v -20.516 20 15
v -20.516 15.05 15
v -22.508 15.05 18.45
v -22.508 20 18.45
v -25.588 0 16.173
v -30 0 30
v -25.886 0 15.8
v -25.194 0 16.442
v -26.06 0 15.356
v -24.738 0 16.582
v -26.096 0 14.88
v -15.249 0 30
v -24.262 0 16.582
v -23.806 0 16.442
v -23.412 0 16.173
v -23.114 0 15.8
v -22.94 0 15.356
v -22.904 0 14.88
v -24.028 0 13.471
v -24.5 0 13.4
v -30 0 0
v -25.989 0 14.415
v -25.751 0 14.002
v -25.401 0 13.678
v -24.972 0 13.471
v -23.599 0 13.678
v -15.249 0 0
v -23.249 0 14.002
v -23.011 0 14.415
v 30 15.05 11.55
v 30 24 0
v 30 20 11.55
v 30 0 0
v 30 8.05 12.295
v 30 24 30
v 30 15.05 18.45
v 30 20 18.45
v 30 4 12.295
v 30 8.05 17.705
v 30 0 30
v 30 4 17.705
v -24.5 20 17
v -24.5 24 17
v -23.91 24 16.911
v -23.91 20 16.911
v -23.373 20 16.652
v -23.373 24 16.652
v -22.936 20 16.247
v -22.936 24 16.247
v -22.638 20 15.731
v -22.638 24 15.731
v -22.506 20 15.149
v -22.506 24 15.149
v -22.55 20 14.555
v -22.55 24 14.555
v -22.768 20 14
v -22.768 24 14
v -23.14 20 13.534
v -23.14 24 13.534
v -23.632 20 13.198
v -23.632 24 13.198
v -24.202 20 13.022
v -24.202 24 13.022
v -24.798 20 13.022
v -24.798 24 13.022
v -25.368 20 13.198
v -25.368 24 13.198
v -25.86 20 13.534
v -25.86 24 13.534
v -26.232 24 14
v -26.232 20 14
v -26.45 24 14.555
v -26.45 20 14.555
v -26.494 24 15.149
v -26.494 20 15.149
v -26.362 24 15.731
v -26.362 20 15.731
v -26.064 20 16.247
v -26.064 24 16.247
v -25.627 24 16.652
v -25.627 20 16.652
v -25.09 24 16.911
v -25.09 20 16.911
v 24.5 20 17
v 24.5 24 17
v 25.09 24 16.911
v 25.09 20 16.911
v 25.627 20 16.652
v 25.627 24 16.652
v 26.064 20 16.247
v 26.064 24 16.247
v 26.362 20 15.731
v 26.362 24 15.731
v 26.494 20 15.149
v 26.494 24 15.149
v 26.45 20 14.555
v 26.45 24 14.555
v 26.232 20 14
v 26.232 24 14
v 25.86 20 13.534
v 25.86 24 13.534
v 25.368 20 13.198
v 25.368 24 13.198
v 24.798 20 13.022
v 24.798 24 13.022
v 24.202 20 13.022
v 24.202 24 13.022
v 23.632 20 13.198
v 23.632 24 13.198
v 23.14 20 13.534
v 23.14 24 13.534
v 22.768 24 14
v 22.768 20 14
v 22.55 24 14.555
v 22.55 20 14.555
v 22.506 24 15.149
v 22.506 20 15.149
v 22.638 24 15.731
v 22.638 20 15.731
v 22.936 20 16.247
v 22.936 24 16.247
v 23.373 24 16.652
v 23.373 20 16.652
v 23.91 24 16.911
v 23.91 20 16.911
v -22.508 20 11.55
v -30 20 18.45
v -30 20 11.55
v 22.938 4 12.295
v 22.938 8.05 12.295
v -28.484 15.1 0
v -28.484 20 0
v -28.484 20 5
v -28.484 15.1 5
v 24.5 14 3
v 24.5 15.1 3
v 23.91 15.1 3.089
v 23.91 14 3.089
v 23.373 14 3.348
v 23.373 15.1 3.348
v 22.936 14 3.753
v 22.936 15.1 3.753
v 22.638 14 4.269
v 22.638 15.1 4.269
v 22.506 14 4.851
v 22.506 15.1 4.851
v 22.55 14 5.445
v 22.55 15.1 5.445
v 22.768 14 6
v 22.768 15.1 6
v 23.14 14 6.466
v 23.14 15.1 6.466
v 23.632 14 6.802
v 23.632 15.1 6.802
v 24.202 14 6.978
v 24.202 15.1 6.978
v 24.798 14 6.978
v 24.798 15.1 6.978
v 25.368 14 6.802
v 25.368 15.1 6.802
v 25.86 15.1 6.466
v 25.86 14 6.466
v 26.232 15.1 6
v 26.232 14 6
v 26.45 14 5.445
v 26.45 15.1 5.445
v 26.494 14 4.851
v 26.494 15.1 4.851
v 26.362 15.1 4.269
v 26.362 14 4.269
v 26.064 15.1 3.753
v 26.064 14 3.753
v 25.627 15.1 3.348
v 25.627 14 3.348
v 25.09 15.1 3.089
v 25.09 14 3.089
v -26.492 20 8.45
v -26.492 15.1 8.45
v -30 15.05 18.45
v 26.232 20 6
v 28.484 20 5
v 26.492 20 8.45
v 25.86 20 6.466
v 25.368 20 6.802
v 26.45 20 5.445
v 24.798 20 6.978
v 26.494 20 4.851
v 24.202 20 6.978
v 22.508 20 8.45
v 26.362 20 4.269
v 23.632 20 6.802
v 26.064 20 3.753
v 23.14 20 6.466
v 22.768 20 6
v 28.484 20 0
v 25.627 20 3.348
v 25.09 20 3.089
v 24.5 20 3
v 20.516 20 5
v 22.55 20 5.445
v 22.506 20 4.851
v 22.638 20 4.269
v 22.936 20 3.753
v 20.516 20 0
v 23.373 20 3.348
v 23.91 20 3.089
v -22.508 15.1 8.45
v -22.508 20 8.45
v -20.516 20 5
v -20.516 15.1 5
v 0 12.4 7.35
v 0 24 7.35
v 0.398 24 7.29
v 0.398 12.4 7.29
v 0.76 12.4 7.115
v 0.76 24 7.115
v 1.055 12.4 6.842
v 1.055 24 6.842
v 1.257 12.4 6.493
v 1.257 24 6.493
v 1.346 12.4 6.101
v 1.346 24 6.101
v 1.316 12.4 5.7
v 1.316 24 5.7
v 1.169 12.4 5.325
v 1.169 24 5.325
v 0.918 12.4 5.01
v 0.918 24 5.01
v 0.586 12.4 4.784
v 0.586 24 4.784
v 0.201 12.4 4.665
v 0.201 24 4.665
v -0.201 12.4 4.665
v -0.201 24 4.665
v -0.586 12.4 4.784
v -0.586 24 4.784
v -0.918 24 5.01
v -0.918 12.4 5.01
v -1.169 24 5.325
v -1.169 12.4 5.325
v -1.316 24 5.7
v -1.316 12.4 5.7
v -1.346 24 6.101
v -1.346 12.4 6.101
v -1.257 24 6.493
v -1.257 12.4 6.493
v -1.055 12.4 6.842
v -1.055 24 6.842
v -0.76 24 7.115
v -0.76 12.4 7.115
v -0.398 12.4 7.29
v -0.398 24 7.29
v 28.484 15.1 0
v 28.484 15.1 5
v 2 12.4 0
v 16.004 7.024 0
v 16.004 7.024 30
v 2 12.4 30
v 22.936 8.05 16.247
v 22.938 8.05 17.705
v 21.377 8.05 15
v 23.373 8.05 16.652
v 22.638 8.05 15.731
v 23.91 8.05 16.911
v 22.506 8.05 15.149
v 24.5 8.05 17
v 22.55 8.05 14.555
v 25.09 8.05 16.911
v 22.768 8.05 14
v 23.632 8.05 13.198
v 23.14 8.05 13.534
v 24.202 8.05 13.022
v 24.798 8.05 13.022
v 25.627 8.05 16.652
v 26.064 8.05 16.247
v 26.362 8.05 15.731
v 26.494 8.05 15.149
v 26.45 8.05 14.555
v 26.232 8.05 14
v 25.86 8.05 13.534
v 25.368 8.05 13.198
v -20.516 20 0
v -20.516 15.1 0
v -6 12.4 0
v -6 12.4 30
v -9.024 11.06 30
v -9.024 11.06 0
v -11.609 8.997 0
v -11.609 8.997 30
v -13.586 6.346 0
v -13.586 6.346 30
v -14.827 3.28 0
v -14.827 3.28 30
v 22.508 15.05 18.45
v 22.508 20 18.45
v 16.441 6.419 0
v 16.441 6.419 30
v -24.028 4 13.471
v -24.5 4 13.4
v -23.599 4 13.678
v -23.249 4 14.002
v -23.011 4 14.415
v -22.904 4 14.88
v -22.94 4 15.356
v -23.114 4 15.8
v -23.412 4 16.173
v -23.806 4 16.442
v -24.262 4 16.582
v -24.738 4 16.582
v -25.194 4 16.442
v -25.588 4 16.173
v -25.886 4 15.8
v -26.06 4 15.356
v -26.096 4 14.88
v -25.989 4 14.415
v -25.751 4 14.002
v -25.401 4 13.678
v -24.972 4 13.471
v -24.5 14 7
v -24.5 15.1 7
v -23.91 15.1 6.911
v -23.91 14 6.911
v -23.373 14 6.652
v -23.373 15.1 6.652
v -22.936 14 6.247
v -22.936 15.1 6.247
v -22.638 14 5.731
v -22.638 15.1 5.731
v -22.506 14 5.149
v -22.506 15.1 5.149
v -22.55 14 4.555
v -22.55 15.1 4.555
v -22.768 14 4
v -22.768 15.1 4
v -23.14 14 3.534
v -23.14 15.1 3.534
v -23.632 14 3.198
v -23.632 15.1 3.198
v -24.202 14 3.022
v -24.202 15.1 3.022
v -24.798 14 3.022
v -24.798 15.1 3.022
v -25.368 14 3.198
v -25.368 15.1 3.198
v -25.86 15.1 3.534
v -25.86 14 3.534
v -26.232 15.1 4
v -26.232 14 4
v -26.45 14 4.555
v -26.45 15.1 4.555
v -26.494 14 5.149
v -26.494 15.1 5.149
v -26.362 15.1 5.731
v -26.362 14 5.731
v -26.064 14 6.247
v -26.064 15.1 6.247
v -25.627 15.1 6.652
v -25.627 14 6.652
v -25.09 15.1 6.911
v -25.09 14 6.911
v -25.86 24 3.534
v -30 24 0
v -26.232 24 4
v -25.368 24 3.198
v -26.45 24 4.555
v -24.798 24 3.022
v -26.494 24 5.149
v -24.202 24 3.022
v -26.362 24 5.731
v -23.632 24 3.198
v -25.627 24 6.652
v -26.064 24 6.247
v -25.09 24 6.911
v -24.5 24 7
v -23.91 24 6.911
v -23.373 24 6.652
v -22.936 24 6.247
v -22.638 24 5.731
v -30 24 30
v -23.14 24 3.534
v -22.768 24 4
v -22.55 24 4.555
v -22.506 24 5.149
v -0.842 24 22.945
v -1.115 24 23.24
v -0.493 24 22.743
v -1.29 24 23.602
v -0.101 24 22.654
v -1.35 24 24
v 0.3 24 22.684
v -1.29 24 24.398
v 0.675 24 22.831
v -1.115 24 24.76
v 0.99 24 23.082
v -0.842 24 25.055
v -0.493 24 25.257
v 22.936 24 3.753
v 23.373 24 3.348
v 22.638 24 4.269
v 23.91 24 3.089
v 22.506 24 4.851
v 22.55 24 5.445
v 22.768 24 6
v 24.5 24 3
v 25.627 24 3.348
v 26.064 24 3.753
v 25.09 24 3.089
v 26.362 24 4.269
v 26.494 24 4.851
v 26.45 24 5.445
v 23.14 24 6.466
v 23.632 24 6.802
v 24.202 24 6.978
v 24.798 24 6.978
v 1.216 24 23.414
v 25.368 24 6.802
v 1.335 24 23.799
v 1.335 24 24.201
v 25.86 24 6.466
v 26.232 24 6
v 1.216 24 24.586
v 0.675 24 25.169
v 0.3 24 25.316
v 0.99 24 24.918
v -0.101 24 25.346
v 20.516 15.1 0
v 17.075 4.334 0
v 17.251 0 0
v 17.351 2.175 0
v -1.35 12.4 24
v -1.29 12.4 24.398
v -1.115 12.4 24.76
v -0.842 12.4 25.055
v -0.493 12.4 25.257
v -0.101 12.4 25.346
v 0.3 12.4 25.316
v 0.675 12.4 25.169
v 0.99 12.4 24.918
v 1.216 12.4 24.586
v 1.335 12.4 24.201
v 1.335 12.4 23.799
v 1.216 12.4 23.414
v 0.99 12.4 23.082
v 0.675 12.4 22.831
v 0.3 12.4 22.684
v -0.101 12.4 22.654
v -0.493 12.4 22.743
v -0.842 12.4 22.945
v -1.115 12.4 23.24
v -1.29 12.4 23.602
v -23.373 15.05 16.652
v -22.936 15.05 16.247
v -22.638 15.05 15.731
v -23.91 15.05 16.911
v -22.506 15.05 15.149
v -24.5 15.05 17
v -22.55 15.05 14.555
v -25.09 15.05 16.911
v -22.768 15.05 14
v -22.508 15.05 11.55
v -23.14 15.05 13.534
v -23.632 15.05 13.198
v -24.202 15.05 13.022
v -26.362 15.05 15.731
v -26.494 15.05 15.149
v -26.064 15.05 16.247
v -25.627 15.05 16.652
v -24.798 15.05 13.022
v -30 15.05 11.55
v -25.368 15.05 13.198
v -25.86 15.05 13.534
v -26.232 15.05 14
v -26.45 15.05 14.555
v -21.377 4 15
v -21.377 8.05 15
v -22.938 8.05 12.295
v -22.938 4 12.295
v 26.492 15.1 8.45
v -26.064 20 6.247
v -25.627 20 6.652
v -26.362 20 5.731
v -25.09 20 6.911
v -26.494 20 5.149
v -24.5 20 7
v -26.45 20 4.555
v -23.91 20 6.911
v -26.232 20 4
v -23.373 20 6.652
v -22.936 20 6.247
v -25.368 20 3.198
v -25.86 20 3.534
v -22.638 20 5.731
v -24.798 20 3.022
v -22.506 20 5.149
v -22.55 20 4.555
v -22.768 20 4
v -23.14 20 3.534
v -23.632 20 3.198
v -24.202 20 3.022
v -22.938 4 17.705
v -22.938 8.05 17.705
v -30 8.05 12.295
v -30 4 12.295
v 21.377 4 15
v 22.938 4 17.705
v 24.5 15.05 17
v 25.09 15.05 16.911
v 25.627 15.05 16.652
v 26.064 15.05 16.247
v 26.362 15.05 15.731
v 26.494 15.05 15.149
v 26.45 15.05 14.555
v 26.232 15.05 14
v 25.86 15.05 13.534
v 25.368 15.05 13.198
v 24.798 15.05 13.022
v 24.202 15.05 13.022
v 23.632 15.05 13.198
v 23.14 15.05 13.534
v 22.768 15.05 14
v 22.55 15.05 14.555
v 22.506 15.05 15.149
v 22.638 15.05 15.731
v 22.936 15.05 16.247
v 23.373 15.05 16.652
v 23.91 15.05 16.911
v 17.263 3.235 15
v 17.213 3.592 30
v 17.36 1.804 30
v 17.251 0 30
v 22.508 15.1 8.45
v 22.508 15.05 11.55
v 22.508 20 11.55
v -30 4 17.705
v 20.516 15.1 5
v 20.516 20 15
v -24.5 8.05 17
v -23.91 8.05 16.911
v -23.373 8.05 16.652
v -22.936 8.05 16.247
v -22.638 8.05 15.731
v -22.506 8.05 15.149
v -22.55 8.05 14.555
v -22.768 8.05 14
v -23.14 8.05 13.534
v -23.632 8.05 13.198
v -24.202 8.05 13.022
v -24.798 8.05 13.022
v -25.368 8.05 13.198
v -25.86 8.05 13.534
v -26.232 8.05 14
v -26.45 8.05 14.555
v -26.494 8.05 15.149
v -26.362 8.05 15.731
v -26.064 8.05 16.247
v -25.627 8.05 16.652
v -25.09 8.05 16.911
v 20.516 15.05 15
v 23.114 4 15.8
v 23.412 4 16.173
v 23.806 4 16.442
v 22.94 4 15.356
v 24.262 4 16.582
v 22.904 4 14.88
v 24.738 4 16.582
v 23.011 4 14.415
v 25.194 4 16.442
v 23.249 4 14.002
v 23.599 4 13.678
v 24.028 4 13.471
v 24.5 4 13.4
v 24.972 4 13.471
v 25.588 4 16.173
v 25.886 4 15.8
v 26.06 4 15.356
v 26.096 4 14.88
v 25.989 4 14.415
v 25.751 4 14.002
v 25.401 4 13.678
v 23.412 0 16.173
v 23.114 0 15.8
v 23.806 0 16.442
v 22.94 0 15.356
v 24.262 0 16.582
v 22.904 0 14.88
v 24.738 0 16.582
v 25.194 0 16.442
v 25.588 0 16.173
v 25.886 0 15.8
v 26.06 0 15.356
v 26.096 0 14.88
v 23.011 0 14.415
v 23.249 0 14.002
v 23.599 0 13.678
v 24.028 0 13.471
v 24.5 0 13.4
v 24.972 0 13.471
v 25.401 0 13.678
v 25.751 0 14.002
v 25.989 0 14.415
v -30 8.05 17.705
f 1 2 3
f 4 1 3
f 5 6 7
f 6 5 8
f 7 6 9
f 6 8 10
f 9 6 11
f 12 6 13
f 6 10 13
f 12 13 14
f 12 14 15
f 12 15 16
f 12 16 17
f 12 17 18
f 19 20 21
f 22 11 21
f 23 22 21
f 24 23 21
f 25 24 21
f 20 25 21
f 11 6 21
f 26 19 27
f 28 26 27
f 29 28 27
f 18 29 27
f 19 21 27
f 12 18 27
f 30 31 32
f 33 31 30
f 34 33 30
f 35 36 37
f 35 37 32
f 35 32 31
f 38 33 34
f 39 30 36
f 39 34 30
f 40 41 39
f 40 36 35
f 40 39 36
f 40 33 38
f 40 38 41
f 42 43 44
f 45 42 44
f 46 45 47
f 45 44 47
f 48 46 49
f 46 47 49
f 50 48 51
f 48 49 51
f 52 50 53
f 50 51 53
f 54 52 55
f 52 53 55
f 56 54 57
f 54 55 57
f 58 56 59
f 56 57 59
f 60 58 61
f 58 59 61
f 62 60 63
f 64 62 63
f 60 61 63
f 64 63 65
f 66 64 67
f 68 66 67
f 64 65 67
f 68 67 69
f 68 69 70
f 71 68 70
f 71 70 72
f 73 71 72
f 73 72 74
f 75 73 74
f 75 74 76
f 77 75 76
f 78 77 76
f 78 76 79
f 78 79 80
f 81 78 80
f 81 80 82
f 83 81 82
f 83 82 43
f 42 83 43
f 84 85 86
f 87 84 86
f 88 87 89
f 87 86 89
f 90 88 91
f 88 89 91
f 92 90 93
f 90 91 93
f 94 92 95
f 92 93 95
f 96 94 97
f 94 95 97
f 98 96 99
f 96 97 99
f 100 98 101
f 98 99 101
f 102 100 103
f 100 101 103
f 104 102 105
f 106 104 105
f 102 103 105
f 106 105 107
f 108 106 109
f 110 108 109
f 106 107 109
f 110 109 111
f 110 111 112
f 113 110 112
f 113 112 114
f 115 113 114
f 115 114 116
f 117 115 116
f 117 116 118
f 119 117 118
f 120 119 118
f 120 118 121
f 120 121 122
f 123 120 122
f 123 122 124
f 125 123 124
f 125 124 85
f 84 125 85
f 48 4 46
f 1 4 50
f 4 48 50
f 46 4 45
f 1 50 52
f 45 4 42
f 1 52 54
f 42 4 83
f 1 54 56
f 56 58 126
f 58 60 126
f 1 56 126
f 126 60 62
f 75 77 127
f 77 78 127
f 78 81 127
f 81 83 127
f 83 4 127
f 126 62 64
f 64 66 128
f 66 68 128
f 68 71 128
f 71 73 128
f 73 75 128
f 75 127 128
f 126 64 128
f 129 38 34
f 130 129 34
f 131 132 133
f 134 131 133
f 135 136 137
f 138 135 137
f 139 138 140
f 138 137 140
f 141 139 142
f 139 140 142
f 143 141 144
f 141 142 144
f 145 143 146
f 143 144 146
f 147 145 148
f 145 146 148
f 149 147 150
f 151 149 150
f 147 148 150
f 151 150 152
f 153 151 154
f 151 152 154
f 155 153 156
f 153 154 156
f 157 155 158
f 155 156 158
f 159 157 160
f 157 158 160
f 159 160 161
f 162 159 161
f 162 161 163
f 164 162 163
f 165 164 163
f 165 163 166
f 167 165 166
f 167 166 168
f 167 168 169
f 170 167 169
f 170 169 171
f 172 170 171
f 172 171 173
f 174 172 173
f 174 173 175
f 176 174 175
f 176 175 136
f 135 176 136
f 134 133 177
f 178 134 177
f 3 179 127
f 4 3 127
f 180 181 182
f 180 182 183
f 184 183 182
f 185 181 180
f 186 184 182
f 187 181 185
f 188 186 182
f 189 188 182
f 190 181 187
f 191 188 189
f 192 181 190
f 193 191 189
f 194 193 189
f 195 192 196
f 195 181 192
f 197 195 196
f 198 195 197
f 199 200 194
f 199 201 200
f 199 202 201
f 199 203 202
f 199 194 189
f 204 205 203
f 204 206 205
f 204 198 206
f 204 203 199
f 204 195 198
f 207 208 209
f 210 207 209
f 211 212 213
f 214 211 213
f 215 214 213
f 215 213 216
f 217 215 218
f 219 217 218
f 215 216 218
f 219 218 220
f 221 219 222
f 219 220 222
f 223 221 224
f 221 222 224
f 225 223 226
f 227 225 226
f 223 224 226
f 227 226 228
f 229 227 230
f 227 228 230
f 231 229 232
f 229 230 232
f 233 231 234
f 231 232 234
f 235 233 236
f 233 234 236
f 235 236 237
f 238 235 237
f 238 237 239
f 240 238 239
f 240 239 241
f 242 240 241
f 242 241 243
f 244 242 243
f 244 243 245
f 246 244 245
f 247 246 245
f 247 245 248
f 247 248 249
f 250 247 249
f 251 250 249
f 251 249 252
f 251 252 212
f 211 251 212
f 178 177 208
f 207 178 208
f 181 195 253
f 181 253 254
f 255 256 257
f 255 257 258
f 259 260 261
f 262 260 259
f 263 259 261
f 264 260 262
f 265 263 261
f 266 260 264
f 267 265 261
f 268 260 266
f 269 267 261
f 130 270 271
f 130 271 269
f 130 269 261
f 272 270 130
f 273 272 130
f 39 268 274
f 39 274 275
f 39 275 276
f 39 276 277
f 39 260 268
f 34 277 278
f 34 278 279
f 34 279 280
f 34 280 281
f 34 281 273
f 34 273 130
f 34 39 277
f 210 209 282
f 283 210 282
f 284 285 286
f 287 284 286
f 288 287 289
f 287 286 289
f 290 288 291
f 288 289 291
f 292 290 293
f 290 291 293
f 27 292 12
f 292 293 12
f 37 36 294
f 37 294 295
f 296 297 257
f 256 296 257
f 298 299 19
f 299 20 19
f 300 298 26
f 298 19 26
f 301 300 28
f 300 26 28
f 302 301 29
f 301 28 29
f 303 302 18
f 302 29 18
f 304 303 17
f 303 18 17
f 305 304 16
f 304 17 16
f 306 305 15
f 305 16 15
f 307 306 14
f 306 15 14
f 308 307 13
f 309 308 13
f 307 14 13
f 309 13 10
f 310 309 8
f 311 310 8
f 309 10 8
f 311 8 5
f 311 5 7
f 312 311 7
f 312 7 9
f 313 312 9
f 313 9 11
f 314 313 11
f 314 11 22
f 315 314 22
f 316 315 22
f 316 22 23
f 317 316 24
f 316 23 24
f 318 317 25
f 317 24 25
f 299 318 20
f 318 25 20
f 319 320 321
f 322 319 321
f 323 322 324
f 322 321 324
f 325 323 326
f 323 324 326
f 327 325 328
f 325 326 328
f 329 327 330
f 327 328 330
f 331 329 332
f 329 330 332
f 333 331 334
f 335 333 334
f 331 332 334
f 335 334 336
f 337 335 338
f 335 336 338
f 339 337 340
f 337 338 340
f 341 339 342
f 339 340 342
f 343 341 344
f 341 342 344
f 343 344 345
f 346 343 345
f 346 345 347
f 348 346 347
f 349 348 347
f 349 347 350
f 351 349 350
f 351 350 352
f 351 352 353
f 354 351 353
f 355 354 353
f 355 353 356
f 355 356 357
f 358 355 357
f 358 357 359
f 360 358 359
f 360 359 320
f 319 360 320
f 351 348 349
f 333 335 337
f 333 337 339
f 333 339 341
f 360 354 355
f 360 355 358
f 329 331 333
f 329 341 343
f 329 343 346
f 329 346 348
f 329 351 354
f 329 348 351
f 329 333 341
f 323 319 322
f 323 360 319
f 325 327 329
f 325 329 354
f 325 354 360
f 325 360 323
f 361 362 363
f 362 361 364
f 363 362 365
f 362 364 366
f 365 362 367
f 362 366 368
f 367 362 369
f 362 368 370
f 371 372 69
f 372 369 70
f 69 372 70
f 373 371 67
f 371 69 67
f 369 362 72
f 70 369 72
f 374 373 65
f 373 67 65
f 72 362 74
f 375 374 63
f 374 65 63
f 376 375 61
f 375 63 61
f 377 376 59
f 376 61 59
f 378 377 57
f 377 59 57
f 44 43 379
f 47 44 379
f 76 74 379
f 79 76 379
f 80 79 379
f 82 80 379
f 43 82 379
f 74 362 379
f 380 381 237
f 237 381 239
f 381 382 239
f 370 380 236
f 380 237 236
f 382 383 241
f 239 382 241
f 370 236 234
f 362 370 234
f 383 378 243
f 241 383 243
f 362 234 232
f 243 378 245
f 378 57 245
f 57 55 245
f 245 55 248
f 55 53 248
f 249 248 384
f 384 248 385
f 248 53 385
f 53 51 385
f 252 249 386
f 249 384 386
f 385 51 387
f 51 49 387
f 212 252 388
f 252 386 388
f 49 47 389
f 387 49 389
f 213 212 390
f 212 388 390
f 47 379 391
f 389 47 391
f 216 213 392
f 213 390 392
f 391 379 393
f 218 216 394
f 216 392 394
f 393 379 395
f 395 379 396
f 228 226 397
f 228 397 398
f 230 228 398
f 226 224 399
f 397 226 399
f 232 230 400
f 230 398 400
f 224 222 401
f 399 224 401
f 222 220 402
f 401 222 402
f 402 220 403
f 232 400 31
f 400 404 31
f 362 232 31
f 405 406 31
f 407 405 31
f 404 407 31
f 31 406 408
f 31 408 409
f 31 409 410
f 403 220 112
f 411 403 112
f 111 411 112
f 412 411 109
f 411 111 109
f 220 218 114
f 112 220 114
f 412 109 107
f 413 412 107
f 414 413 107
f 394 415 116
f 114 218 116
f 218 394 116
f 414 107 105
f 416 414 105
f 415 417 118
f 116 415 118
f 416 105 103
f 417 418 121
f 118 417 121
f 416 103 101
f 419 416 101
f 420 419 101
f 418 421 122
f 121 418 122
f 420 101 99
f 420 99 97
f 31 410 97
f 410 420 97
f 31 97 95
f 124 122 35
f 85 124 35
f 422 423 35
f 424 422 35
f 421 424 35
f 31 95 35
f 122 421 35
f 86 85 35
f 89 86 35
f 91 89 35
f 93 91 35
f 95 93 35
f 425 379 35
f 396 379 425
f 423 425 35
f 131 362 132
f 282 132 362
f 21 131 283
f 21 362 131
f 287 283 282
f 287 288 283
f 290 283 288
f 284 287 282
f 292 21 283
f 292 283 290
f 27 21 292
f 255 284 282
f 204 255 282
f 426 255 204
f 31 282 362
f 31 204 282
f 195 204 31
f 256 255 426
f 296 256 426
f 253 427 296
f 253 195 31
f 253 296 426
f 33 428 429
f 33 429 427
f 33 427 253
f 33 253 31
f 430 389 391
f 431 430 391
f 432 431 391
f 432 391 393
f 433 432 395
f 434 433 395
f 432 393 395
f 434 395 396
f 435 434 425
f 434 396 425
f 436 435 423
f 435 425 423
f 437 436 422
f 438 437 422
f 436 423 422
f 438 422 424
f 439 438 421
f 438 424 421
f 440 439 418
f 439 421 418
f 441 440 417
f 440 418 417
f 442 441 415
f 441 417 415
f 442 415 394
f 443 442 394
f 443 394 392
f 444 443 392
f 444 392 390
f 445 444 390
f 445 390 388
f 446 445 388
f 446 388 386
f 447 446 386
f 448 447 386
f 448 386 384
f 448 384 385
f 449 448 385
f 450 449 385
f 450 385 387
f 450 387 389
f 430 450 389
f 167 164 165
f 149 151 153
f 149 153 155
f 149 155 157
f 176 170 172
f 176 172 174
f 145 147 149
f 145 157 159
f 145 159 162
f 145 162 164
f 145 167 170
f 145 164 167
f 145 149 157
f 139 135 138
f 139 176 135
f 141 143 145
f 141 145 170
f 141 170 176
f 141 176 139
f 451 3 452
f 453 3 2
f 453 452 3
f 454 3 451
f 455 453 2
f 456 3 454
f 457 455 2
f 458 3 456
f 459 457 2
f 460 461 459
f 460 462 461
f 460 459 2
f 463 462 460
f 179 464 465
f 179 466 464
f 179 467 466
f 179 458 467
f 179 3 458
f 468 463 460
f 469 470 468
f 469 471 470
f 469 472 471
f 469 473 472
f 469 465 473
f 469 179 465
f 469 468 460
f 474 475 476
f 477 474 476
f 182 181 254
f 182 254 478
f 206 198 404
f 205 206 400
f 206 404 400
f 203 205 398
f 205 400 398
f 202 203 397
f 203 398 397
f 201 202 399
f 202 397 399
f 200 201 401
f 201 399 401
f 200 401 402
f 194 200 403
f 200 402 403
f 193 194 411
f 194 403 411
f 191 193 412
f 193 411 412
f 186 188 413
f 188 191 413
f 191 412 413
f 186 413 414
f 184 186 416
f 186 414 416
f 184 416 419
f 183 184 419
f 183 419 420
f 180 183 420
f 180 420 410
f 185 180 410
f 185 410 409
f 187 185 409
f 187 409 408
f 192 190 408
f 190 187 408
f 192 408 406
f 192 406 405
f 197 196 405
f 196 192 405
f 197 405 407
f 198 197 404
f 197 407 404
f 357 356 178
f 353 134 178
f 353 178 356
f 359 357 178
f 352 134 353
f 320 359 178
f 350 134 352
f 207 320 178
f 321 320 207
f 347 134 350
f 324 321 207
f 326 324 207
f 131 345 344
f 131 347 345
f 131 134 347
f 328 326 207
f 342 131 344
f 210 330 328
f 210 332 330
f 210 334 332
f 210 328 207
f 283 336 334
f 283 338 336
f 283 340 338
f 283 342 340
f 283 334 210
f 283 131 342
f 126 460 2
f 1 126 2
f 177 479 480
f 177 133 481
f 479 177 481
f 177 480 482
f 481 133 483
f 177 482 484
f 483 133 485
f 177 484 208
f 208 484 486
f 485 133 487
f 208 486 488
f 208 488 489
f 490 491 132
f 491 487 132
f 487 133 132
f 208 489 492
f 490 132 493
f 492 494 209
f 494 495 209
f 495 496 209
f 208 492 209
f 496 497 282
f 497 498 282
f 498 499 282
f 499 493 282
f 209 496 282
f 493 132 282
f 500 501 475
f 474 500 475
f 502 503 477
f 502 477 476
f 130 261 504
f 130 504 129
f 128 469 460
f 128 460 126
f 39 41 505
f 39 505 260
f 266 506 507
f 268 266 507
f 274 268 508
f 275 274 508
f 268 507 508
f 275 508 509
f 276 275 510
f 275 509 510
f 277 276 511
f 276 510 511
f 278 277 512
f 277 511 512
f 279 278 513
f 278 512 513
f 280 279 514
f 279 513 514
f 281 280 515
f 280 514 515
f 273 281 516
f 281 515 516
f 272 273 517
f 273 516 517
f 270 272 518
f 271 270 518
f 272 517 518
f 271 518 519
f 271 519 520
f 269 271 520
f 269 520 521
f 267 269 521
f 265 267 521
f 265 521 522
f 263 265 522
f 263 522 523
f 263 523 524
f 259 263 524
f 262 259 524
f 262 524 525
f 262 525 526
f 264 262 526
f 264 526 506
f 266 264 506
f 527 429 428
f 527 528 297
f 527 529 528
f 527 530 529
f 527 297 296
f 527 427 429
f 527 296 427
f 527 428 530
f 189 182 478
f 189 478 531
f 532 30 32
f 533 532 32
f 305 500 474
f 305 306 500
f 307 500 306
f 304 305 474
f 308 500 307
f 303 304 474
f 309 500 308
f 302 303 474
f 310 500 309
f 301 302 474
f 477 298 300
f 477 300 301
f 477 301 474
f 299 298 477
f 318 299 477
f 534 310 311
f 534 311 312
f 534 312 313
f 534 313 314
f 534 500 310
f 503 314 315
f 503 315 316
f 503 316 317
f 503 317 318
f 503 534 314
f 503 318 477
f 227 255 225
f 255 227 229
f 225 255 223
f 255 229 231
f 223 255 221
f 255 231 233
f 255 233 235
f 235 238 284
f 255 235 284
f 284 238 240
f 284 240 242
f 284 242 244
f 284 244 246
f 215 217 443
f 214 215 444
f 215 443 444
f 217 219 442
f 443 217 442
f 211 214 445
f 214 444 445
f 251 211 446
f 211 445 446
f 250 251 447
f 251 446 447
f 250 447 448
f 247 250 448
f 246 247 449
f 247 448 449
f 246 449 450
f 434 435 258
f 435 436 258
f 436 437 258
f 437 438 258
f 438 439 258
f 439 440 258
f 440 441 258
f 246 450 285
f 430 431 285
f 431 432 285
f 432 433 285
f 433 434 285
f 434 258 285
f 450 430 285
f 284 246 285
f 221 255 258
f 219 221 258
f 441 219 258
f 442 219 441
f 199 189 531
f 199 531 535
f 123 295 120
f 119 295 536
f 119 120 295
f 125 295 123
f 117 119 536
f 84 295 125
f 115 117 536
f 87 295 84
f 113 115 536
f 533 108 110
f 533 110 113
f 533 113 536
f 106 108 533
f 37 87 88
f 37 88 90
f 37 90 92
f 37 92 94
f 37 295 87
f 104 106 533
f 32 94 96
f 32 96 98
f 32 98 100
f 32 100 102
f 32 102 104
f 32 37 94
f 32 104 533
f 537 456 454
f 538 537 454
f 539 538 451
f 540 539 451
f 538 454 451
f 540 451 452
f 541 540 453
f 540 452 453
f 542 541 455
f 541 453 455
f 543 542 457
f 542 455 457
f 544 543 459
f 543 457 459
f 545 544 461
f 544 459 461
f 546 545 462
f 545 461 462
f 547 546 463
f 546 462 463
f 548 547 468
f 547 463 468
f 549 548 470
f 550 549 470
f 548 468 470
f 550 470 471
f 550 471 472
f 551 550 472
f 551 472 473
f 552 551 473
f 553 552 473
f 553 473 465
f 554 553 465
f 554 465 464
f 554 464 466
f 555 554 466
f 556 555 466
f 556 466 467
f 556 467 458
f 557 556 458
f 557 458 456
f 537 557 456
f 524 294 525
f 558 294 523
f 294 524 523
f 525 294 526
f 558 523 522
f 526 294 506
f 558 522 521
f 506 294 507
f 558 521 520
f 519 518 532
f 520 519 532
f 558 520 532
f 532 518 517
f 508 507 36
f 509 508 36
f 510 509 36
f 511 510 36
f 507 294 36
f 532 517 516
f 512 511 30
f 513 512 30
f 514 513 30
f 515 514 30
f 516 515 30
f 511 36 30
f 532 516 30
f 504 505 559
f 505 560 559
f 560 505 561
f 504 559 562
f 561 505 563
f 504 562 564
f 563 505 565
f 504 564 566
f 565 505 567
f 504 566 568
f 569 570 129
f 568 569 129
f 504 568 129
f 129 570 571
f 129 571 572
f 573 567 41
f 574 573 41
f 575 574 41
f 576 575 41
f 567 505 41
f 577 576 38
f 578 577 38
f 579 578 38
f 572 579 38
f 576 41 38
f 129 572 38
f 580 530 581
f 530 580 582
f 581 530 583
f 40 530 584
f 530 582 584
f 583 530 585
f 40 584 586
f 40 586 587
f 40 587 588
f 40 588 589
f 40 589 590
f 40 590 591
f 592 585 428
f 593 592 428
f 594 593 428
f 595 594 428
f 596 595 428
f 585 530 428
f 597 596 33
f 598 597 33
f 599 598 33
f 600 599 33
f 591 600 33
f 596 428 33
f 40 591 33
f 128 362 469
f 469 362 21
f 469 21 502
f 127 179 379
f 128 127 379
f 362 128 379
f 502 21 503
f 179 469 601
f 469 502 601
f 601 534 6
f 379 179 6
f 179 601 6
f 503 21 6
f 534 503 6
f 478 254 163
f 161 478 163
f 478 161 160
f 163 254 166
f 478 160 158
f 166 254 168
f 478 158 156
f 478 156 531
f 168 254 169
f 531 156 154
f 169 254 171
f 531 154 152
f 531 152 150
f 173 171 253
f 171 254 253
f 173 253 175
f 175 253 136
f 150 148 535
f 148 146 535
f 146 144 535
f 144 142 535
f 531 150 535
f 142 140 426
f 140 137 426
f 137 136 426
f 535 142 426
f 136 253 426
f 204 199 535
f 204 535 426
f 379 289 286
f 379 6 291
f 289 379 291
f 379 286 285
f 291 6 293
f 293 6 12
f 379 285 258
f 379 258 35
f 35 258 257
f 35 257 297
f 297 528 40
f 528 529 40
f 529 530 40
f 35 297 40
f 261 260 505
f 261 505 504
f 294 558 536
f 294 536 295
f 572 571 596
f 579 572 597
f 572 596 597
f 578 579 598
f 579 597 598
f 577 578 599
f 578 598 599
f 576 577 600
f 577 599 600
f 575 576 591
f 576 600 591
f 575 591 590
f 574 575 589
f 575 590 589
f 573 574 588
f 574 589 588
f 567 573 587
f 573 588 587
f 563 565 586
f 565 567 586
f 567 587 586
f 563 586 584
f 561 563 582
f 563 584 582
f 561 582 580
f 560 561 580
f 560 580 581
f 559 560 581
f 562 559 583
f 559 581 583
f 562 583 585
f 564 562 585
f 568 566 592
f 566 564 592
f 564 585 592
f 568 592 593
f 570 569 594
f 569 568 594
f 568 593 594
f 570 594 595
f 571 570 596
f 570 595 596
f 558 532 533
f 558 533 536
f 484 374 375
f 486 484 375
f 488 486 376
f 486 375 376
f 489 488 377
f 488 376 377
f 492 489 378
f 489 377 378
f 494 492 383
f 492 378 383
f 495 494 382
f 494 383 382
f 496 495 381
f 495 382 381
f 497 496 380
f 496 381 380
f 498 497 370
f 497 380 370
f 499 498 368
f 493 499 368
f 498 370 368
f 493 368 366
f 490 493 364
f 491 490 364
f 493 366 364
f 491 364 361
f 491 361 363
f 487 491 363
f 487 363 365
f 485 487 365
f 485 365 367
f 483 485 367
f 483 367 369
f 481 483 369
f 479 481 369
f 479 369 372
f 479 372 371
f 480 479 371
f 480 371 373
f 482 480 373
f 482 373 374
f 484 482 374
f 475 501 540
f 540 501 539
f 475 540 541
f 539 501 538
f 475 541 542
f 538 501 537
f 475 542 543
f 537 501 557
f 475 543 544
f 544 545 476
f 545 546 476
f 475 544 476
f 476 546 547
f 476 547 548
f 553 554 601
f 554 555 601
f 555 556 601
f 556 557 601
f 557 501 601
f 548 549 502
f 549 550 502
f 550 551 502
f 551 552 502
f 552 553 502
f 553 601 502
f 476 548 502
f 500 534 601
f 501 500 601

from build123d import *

# Parameters (mm, degrees)
SKETCH_1_W           = 60
SKETCH_1_H           = 34
EXTRUDE_1_DEPTH      = 30
SKETCH_17_W          = 12
SKETCH_17_H          = 23
EXTRUDE_8_DEPTH      = 80
SKETCH_18_R          = 2
CUT_EXTRUDE_7_DEPTH  = 10
CUT_EXTRUDE_8_DEPTH  = 66
SKETCH_20_W          = 4.5
SKETCH_20_H          = 17.2
CUT_EXTRUDE_9_DEPTH  = 8.8
SKETCH_14_R          = 1.6
CUT_EXTRUDE_6_DEPTH  = 103.708324882
EXTRUDE_START        = 7
SKETCH_21_W          = 60
SKETCH_21_H          = 30
SKETCH_21_R          = 1.6
EXTRUDE_9_DEPTH      = 7
SKETCH_22_W          = 36
SKETCH_22_H          = 30
EXTRUDE_10_DEPTH     = 7
SKETCH_27_W          = 12
SKETCH_27_H          = 50
CUT_EXTRUDE_13_DEPTH = 95.768138106
SKETCH_29_W          = 12
SKETCH_29_H          = 16
CUT_EXTRUDE_14_DEPTH = 71.710678119
SKETCH_36_W          = 12
SKETCH_36_H          = 23
CUT_EXTRUDE_21_DEPTH = 50
SKETCH_37_W          = 12
SKETCH_37_H          = 16
CUT_EXTRUDE_22_DEPTH = 59.309518948
SKETCH_38_W          = 60
SKETCH_38_H          = 30
CUT_EXTRUDE_23_DEPTH = 34
SKETCH_41_W          = 6.9
SKETCH_41_H          = 4.95
SKETCH_41_W_2        = 5.41
SKETCH_41_H_2        = 4.05
CUT_EXTRUDE_25_DEPTH = 5.5
CUT_EXTRUDE_26_DEPTH = 49.744230428
SKETCH_43_R          = 1.35
CUT_EXTRUDE_27_DEPTH = 49.7442306
SKETCH_47_R          = 1.9
CUT_EXTRUDE_29_DEPTH = 7
SKETCH_48_R          = 2
CUT_EXTRUDE_30_DEPTH = 10
CUT_EXTRUDE_START    = -4
SKETCH_49_R          = 2
CUT_EXTRUDE_31_DEPTH = 4.9
CUT_EXTRUDE_32_DEPTH = 4.05
CUT_EXTRUDE_33_DEPTH = 4.95
CUT_EXTRUDE_34_REACH = 50.744
SKETCH_53_R          = 2


with BuildPart() as part:
    # 草图1 → 凸台-拉伸1 (new body)
    with BuildSketch(Plane.XY):
        Rectangle(SKETCH_1_W, SKETCH_1_H)
    extrude(amount=EXTRUDE_1_DEPTH)

    # 草图17 → 凸台-拉伸8 (add)
    with BuildSketch(Plane(origin=(0, 0, 0), x_dir=(-1, 0, 0), z_dir=(0, 0, -1))):
        with Locations((24, 28.5)):
            Rectangle(SKETCH_17_W, SKETCH_17_H)
        with Locations((-24, 28.5)):
            Rectangle(SKETCH_17_W, SKETCH_17_H)
    extrude(amount=-EXTRUDE_8_DEPTH)

    # 草图18 → 切除-拉伸7 (cut)
    with BuildSketch(Plane.XY.offset(80)):
        with Locations((24.5, 34)):
            Circle(SKETCH_18_R)
        with Locations((24.5, 24)):
            Circle(SKETCH_18_R)
        with Locations((-24.5, 24)):
            Circle(SKETCH_18_R)
        with Locations((-24.5, 34)):
            Circle(SKETCH_18_R)
    extrude(amount=-CUT_EXTRUDE_7_DEPTH, mode=Mode.SUBTRACT)

    # 草图19 → 切除-拉伸8 (cut)
    with BuildSketch(Plane.XY.offset(30)):
        with BuildLine():
            Line((2, 12.4), (-6, 12.4))
            ThreePointArc((-6, 12.4), (-15.249310993, 0), (-6, -12.4))
            Line((-6, -12.4), (2, -12.4))
            Line((2, -12.4), (16.003706397, -7.024480757))
            ThreePointArc((16.003706397, -7.024480757), (17.250689007, 0), (16.003706397, 7.024480757))
            Line((16.003706397, 7.024480757), (2, 12.4))
        make_face()
    extrude(amount=-CUT_EXTRUDE_8_DEPTH, mode=Mode.SUBTRACT)

    # 草图20 → 切除-拉伸9 (cut)
    with BuildSketch(Plane(origin=(30, 0, 0), x_dir=(0, 0, -1), z_dir=(1, 0, 0))):
        with Locations((-67.75, 28.8)):
            Rectangle(SKETCH_20_W, SKETCH_20_H)
    cut_extrude_9 = extrude(amount=-CUT_EXTRUDE_9_DEPTH, mode=Mode.SUBTRACT)

    # 草图14 → 切除-拉伸6 (cut, through all)
    with BuildSketch(Plane.XZ.offset(17)):
        with Locations(Location((24.5, 15, 0), (0, 0, 270))):
            Circle(SKETCH_14_R)
        with Locations(Location((-24.5, 15, 0), (0, 0, 270))):
            Circle(SKETCH_14_R)
    extrude(amount=-CUT_EXTRUDE_6_DEPTH, mode=Mode.SUBTRACT)

    # 镜向3: 切除-拉伸9 across plane
    add(cut_extrude_9.mirror(Plane(origin=(0, 0, 0), x_dir=(0, 0, 1), z_dir=(1, 0, 0))), mode=Mode.SUBTRACT)

    # 草图21 → 凸台-拉伸9 (add)
    with BuildSketch(Plane.XZ.offset(17).offset(EXTRUDE_START)):
        with Locations((0, 15)):
            Rectangle(SKETCH_21_W, SKETCH_21_H)
        with Locations(Location((24.5, 15, 0), (0, 0, 270))):
            Circle(SKETCH_21_R, mode=Mode.SUBTRACT)
        with Locations(Location((-24.5, 15, 0), (0, 0, 270))):
            Circle(SKETCH_21_R, mode=Mode.SUBTRACT)
    extrude(amount=-EXTRUDE_9_DEPTH)

    # 草图22 → 凸台-拉伸10 (add)
    with BuildSketch(Plane(origin=(0, 17, 0), x_dir=(1, 0, 0), z_dir=(0, 1, 0))):
        with Locations((0, -15)):
            Rectangle(SKETCH_22_W, SKETCH_22_H)
    extrude(amount=EXTRUDE_10_DEPTH)

    # 草图27 → 切除-拉伸13 (cut, through all)
    with BuildSketch(Plane.XZ.offset(-17)):
        with Locations((24, 55)):
            Rectangle(SKETCH_27_W, SKETCH_27_H)
    extrude(amount=-CUT_EXTRUDE_13_DEPTH, mode=Mode.SUBTRACT)

    # 草图29 → 切除-拉伸14 (cut, through all)
    with BuildSketch(Plane.XY.offset(30)):
        with Locations((24, 32)):
            Rectangle(SKETCH_29_W, SKETCH_29_H)
    extrude(amount=-CUT_EXTRUDE_14_DEPTH, mode=Mode.SUBTRACT)

    # 草图36 → 切除-拉伸21 (cut)
    with BuildSketch(Plane.XY.offset(80)):
        with Locations((-24, 28.5)):
            Rectangle(SKETCH_36_W, SKETCH_36_H)
    extrude(amount=-CUT_EXTRUDE_21_DEPTH, mode=Mode.SUBTRACT)

    # 草图37 → 切除-拉伸22 (cut, through all)
    with BuildSketch(Plane.XY.offset(30)):
        with Locations((-24, 32)):
            Rectangle(SKETCH_37_W, SKETCH_37_H)
    extrude(amount=-CUT_EXTRUDE_22_DEPTH, mode=Mode.SUBTRACT)

    # 草图38 → 切除-拉伸23 (cut)
    with BuildSketch(Plane(origin=(0, 0, 0), x_dir=(1, 0, 0), z_dir=(0, 1, 0))):
        with Locations((0, -15)):
            Rectangle(SKETCH_38_W, SKETCH_38_H)
    extrude(amount=-CUT_EXTRUDE_23_DEPTH, mode=Mode.SUBTRACT)

    # 草图41 → 切除-拉伸25 (cut)
    with BuildSketch(Plane(origin=(30, 0, 0), x_dir=(0, 0, -1), z_dir=(1, 0, 0))):
        with Locations((-15, 17.525)):
            Rectangle(SKETCH_41_W, SKETCH_41_H)
        with Locations((-15, 6.025)):
            Rectangle(SKETCH_41_W_2, SKETCH_41_H_2)
    cut_extrude_25 = extrude(amount=-CUT_EXTRUDE_25_DEPTH, mode=Mode.SUBTRACT)

    # 镜向5: 切除-拉伸25 across plane
    add(cut_extrude_25.mirror(Plane(origin=(0, 0, 0), x_dir=(0, 0, 1), z_dir=(1, 0, 0))), mode=Mode.SUBTRACT)

    # 草图42 → 切除-拉伸26 (cut, through all)
    with BuildSketch(Plane.XY.offset(30)):
        with BuildLine():
            Line((16.003706397, 7.024480757), (14.503027832, 1.394480604))
            Line((14.503027832, 1.394480604), (17.250689007, 0))
            add(Edge.make_bspline(
                [(16.44131127, 6.418576517), (17.679905774, 3.26163083), (17.250689007, 0)],
                knots=[0, 0, 0, 1, 1, 1], degree=2))
            Line((16.44131127, 6.418576517), (16.003706397, 7.024480757))
        make_face()
    extrude(amount=-CUT_EXTRUDE_26_DEPTH, mode=Mode.SUBTRACT)

    # 草图43 → 切除-拉伸27 (cut, through all)
    with BuildSketch(Plane(origin=(0, 24, 0), x_dir=(1, 0, 0), z_dir=(0, 1, 0))):
        with Locations(Location((0, -6, 0), (0, 0, 270))):
            Circle(SKETCH_43_R)
        with Locations(Location((0, -24, 0), (0, 0, 180))):
            Circle(SKETCH_43_R)
    extrude(amount=-CUT_EXTRUDE_27_DEPTH, mode=Mode.SUBTRACT)

    # 草图47 → 切除-拉伸29 (cut)
    with BuildSketch(Plane(origin=(0, 24, 0), x_dir=(1, 0, 0), z_dir=(0, 1, 0))):
        with Locations(Location((-24.5, -15, 0), (0, 0, 270))):
            Circle(SKETCH_47_R)
        with Locations(Location((24.5, -15, 0), (0, 0, 270))):
            Circle(SKETCH_47_R)
    extrude(amount=-CUT_EXTRUDE_29_DEPTH, mode=Mode.SUBTRACT)

    # 草图48 → 切除-拉伸30 (cut)
    with BuildSketch(Plane(origin=(0, 24, 0), x_dir=(1, 0, 0), z_dir=(0, 1, 0))):
        with Locations(Location((-24.5, -5, 0), (0, 0, 270))):
            Circle(SKETCH_48_R)
        with Locations(Location((24.5, -5, 0), (0, 0, 90))):
            Circle(SKETCH_48_R)
    extrude(amount=-CUT_EXTRUDE_30_DEPTH, mode=Mode.SUBTRACT)

    # 草图49 → 切除-拉伸31 (cut)
    # profile 1 of 2: a face of its own
    with BuildSketch(Plane(origin=(0, 24, 0), x_dir=(1, 0, 0), z_dir=(0, 1, 0)).offset(CUT_EXTRUDE_START)):
        Polygon((-26.491858429, -8.45), (-22.508141571, -8.45), (-20.516283143, -5), (-22.508141571, -1.55), (-26.491858429, -1.55), (-28.483716857, -5), align=None)
        with Locations(Location((-24.5, -5, 0), (0, 0, 270))):
            Circle(SKETCH_49_R, mode=Mode.SUBTRACT)
    # profile 2 of 2: a face of its own
    with BuildSketch(Plane(origin=(0, 24, 0), x_dir=(1, 0, 0), z_dir=(0, 1, 0)).offset(CUT_EXTRUDE_START)):
        Polygon((-28.483716857, 0), (-28.483716857, -5), (-26.491858429, -1.55), (-22.508141571, -1.55), (-20.516283143, -5), (-20.516283143, 0), align=None)
    cut_extrude_31 = extrude(amount=-CUT_EXTRUDE_31_DEPTH, mode=Mode.SUBTRACT)

    # 镜向6: 切除-拉伸31 across plane
    add(cut_extrude_31.mirror(Plane(origin=(0, 0, 0), x_dir=(0, 0, 1), z_dir=(1, 0, 0))), mode=Mode.SUBTRACT)

    # 草图51 → 切除-拉伸32 (cut)
    with BuildSketch(Plane.XZ.offset(-8.05)):
        Polygon((26.061732478, 17.705), (22.938267522, 17.705), (21.376535044, 15), (22.938267522, 12.295), (26.061732478, 12.295), (27.623464956, 15), align=None)
    cut_extrude_32 = extrude(amount=CUT_EXTRUDE_32_DEPTH, mode=Mode.SUBTRACT)

    # 草图52 → 切除-拉伸33 (cut)
    with BuildSketch(Plane(origin=(0, 15.05, 0), x_dir=(1, 0, 0), z_dir=(0, 1, 0))):
        Polygon((26.491858429, -11.55), (22.508141571, -11.55), (20.516283143, -15), (22.508141571, -18.45), (26.491858429, -18.45), (28.483716857, -15), align=None)
    cut_extrude_33 = extrude(amount=CUT_EXTRUDE_33_DEPTH, mode=Mode.SUBTRACT)

    # 镜向7: 切除-拉伸32, 切除-拉伸33 across plane
    add(cut_extrude_32.mirror(Plane(origin=(0, 0, 0), x_dir=(0, 0, 1), z_dir=(1, 0, 0))), mode=Mode.SUBTRACT)
    add(cut_extrude_33.mirror(Plane(origin=(0, 0, 0), x_dir=(0, 0, 1), z_dir=(1, 0, 0))), mode=Mode.SUBTRACT)

    # 草图53 → 切除-拉伸34 (cut, up to next)
    with BuildSketch(Plane(origin=(0, 24, 0), x_dir=(1, 0, 0), z_dir=(0, 1, 0)), mode=Mode.PRIVATE) as cut_extrude_34_sk1:
        with Locations(Location((-24.5, -15, 0), (0, 0, 270))):
            Circle(SKETCH_53_R)
    cut_extrude_34_tool1 = extrude(cut_extrude_34_sk1.sketch, amount=-CUT_EXTRUDE_34_REACH, mode=Mode.PRIVATE) & part.part
    # 草图53 → 切除-拉伸34 (cut, up to next)
    with BuildSketch(Plane(origin=(0, 24, 0), x_dir=(1, 0, 0), z_dir=(0, 1, 0)), mode=Mode.PRIVATE) as cut_extrude_34_sk2:
        with Locations(Location((24.5, -15, 0), (0, 0, 270))):
            Circle(SKETCH_53_R)
    cut_extrude_34_tool2 = extrude(cut_extrude_34_sk2.sketch, amount=-CUT_EXTRUDE_34_REACH, mode=Mode.PRIVATE) & part.part
    add(cut_extrude_34_tool1.solids().sort_by_distance((-24.5, 24, 15))[0], mode=Mode.SUBTRACT)
    add(cut_extrude_34_tool1.solids().sort_by_distance((-24.5, 24, 15))[1], mode=Mode.SUBTRACT)
    add(cut_extrude_34_tool2.solids().sort_by_distance((24.5, 24, 15))[0], mode=Mode.SUBTRACT)
    add(cut_extrude_34_tool2.solids().sort_by_distance((24.5, 24, 15))[1], mode=Mode.SUBTRACT)


solid = part.part
